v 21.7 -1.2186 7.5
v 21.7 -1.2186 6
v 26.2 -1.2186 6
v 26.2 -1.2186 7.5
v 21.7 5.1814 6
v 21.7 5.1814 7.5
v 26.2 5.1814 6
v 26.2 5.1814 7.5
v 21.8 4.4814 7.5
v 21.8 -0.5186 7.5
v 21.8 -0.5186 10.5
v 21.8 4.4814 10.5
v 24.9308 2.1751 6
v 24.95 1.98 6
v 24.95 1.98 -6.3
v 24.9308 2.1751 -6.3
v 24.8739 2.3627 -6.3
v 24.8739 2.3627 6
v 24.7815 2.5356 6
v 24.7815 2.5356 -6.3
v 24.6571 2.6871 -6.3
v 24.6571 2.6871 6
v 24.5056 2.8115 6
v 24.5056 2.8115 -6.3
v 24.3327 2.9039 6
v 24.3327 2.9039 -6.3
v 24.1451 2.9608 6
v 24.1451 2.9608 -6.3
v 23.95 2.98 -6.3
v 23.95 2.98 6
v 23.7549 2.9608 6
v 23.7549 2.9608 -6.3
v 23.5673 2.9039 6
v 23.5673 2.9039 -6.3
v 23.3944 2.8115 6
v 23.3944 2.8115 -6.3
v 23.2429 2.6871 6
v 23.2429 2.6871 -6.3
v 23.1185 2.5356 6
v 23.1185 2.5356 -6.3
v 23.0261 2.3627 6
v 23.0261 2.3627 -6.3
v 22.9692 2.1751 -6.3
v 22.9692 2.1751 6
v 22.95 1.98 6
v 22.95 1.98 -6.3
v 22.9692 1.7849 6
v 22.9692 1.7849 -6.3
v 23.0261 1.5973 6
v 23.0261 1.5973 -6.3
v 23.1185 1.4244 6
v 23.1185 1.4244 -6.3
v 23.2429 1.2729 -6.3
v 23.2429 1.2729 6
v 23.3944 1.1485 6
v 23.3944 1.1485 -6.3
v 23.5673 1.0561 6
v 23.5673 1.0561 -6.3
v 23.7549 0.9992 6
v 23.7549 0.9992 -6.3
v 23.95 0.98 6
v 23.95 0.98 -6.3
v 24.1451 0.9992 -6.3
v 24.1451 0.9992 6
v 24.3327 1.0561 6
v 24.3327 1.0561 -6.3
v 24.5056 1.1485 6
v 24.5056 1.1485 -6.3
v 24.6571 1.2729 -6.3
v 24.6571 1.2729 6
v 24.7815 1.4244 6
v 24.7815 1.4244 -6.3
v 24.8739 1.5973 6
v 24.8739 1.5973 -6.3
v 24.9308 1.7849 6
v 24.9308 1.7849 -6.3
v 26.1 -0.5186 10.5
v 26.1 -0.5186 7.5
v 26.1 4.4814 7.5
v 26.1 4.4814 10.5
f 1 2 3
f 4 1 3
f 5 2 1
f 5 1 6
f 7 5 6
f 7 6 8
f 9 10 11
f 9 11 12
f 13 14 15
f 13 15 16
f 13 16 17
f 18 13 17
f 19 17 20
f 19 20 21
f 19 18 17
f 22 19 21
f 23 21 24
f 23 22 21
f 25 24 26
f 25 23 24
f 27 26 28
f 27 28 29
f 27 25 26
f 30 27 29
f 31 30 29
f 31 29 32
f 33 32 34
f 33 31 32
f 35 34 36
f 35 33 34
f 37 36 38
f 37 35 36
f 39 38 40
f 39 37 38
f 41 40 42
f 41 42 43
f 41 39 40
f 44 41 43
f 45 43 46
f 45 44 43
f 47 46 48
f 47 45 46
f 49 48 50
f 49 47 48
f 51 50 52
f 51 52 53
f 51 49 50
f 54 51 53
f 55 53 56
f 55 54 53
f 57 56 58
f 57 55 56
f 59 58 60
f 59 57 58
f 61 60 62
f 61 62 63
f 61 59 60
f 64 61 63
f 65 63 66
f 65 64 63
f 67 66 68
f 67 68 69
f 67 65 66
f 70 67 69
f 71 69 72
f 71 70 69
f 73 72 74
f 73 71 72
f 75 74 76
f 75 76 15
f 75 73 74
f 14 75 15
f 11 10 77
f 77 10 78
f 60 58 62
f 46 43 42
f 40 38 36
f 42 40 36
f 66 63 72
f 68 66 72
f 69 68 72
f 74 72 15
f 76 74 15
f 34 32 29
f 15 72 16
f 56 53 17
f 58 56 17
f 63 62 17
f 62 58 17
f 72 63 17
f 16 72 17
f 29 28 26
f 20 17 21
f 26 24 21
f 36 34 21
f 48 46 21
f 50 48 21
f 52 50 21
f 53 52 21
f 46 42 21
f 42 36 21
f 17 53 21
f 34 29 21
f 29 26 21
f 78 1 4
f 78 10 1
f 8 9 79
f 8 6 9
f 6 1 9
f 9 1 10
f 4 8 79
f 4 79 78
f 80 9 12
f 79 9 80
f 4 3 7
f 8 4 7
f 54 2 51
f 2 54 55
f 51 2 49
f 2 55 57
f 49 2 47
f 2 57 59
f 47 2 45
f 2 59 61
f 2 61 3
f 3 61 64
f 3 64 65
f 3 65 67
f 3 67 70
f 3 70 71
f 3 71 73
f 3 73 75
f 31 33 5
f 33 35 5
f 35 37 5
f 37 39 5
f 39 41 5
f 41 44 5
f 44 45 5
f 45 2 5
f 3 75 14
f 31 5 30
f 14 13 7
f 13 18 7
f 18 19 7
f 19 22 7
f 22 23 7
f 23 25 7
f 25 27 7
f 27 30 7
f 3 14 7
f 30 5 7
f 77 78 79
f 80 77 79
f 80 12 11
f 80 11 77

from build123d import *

# Parameters (mm, degrees)
SKETCH038_W  = 4.3
SKETCH038_H  = 5
PAD018_DEPTH = 4.5
SKETCH039_W  = 4.5
SKETCH039_H  = 6.4
PAD019_DEPTH = 1.5
SKETCH040_R  = 1
PAD020_DEPTH = 12.3


with BuildPart() as part:
    # Sketch038 → Pad018 (new body)
    with BuildSketch(Plane.XY):
        with Locations((23.95, 1.9814)):
            Rectangle(SKETCH038_W, SKETCH038_H)
    extrude(amount=PAD018_DEPTH)

    # Sketch039 → Pad019 (join)
    with BuildSketch(Plane.XY):
        with Locations((23.95, 1.9814)):
            Rectangle(SKETCH039_W, SKETCH039_H)
    extrude(amount=PAD019_DEPTH)

    # Sketch040 → Pad020 (join)
    with BuildSketch(Plane.XY):
        with Locations((23.95, 1.98)):
            Circle(SKETCH040_R)
    extrude(amount=-PAD020_DEPTH)


with BuildPart() as part_1:
    # Body005 placement: moved
    add(part.part.moved(Location((0, 0, 6))))


solid = part_1.part
